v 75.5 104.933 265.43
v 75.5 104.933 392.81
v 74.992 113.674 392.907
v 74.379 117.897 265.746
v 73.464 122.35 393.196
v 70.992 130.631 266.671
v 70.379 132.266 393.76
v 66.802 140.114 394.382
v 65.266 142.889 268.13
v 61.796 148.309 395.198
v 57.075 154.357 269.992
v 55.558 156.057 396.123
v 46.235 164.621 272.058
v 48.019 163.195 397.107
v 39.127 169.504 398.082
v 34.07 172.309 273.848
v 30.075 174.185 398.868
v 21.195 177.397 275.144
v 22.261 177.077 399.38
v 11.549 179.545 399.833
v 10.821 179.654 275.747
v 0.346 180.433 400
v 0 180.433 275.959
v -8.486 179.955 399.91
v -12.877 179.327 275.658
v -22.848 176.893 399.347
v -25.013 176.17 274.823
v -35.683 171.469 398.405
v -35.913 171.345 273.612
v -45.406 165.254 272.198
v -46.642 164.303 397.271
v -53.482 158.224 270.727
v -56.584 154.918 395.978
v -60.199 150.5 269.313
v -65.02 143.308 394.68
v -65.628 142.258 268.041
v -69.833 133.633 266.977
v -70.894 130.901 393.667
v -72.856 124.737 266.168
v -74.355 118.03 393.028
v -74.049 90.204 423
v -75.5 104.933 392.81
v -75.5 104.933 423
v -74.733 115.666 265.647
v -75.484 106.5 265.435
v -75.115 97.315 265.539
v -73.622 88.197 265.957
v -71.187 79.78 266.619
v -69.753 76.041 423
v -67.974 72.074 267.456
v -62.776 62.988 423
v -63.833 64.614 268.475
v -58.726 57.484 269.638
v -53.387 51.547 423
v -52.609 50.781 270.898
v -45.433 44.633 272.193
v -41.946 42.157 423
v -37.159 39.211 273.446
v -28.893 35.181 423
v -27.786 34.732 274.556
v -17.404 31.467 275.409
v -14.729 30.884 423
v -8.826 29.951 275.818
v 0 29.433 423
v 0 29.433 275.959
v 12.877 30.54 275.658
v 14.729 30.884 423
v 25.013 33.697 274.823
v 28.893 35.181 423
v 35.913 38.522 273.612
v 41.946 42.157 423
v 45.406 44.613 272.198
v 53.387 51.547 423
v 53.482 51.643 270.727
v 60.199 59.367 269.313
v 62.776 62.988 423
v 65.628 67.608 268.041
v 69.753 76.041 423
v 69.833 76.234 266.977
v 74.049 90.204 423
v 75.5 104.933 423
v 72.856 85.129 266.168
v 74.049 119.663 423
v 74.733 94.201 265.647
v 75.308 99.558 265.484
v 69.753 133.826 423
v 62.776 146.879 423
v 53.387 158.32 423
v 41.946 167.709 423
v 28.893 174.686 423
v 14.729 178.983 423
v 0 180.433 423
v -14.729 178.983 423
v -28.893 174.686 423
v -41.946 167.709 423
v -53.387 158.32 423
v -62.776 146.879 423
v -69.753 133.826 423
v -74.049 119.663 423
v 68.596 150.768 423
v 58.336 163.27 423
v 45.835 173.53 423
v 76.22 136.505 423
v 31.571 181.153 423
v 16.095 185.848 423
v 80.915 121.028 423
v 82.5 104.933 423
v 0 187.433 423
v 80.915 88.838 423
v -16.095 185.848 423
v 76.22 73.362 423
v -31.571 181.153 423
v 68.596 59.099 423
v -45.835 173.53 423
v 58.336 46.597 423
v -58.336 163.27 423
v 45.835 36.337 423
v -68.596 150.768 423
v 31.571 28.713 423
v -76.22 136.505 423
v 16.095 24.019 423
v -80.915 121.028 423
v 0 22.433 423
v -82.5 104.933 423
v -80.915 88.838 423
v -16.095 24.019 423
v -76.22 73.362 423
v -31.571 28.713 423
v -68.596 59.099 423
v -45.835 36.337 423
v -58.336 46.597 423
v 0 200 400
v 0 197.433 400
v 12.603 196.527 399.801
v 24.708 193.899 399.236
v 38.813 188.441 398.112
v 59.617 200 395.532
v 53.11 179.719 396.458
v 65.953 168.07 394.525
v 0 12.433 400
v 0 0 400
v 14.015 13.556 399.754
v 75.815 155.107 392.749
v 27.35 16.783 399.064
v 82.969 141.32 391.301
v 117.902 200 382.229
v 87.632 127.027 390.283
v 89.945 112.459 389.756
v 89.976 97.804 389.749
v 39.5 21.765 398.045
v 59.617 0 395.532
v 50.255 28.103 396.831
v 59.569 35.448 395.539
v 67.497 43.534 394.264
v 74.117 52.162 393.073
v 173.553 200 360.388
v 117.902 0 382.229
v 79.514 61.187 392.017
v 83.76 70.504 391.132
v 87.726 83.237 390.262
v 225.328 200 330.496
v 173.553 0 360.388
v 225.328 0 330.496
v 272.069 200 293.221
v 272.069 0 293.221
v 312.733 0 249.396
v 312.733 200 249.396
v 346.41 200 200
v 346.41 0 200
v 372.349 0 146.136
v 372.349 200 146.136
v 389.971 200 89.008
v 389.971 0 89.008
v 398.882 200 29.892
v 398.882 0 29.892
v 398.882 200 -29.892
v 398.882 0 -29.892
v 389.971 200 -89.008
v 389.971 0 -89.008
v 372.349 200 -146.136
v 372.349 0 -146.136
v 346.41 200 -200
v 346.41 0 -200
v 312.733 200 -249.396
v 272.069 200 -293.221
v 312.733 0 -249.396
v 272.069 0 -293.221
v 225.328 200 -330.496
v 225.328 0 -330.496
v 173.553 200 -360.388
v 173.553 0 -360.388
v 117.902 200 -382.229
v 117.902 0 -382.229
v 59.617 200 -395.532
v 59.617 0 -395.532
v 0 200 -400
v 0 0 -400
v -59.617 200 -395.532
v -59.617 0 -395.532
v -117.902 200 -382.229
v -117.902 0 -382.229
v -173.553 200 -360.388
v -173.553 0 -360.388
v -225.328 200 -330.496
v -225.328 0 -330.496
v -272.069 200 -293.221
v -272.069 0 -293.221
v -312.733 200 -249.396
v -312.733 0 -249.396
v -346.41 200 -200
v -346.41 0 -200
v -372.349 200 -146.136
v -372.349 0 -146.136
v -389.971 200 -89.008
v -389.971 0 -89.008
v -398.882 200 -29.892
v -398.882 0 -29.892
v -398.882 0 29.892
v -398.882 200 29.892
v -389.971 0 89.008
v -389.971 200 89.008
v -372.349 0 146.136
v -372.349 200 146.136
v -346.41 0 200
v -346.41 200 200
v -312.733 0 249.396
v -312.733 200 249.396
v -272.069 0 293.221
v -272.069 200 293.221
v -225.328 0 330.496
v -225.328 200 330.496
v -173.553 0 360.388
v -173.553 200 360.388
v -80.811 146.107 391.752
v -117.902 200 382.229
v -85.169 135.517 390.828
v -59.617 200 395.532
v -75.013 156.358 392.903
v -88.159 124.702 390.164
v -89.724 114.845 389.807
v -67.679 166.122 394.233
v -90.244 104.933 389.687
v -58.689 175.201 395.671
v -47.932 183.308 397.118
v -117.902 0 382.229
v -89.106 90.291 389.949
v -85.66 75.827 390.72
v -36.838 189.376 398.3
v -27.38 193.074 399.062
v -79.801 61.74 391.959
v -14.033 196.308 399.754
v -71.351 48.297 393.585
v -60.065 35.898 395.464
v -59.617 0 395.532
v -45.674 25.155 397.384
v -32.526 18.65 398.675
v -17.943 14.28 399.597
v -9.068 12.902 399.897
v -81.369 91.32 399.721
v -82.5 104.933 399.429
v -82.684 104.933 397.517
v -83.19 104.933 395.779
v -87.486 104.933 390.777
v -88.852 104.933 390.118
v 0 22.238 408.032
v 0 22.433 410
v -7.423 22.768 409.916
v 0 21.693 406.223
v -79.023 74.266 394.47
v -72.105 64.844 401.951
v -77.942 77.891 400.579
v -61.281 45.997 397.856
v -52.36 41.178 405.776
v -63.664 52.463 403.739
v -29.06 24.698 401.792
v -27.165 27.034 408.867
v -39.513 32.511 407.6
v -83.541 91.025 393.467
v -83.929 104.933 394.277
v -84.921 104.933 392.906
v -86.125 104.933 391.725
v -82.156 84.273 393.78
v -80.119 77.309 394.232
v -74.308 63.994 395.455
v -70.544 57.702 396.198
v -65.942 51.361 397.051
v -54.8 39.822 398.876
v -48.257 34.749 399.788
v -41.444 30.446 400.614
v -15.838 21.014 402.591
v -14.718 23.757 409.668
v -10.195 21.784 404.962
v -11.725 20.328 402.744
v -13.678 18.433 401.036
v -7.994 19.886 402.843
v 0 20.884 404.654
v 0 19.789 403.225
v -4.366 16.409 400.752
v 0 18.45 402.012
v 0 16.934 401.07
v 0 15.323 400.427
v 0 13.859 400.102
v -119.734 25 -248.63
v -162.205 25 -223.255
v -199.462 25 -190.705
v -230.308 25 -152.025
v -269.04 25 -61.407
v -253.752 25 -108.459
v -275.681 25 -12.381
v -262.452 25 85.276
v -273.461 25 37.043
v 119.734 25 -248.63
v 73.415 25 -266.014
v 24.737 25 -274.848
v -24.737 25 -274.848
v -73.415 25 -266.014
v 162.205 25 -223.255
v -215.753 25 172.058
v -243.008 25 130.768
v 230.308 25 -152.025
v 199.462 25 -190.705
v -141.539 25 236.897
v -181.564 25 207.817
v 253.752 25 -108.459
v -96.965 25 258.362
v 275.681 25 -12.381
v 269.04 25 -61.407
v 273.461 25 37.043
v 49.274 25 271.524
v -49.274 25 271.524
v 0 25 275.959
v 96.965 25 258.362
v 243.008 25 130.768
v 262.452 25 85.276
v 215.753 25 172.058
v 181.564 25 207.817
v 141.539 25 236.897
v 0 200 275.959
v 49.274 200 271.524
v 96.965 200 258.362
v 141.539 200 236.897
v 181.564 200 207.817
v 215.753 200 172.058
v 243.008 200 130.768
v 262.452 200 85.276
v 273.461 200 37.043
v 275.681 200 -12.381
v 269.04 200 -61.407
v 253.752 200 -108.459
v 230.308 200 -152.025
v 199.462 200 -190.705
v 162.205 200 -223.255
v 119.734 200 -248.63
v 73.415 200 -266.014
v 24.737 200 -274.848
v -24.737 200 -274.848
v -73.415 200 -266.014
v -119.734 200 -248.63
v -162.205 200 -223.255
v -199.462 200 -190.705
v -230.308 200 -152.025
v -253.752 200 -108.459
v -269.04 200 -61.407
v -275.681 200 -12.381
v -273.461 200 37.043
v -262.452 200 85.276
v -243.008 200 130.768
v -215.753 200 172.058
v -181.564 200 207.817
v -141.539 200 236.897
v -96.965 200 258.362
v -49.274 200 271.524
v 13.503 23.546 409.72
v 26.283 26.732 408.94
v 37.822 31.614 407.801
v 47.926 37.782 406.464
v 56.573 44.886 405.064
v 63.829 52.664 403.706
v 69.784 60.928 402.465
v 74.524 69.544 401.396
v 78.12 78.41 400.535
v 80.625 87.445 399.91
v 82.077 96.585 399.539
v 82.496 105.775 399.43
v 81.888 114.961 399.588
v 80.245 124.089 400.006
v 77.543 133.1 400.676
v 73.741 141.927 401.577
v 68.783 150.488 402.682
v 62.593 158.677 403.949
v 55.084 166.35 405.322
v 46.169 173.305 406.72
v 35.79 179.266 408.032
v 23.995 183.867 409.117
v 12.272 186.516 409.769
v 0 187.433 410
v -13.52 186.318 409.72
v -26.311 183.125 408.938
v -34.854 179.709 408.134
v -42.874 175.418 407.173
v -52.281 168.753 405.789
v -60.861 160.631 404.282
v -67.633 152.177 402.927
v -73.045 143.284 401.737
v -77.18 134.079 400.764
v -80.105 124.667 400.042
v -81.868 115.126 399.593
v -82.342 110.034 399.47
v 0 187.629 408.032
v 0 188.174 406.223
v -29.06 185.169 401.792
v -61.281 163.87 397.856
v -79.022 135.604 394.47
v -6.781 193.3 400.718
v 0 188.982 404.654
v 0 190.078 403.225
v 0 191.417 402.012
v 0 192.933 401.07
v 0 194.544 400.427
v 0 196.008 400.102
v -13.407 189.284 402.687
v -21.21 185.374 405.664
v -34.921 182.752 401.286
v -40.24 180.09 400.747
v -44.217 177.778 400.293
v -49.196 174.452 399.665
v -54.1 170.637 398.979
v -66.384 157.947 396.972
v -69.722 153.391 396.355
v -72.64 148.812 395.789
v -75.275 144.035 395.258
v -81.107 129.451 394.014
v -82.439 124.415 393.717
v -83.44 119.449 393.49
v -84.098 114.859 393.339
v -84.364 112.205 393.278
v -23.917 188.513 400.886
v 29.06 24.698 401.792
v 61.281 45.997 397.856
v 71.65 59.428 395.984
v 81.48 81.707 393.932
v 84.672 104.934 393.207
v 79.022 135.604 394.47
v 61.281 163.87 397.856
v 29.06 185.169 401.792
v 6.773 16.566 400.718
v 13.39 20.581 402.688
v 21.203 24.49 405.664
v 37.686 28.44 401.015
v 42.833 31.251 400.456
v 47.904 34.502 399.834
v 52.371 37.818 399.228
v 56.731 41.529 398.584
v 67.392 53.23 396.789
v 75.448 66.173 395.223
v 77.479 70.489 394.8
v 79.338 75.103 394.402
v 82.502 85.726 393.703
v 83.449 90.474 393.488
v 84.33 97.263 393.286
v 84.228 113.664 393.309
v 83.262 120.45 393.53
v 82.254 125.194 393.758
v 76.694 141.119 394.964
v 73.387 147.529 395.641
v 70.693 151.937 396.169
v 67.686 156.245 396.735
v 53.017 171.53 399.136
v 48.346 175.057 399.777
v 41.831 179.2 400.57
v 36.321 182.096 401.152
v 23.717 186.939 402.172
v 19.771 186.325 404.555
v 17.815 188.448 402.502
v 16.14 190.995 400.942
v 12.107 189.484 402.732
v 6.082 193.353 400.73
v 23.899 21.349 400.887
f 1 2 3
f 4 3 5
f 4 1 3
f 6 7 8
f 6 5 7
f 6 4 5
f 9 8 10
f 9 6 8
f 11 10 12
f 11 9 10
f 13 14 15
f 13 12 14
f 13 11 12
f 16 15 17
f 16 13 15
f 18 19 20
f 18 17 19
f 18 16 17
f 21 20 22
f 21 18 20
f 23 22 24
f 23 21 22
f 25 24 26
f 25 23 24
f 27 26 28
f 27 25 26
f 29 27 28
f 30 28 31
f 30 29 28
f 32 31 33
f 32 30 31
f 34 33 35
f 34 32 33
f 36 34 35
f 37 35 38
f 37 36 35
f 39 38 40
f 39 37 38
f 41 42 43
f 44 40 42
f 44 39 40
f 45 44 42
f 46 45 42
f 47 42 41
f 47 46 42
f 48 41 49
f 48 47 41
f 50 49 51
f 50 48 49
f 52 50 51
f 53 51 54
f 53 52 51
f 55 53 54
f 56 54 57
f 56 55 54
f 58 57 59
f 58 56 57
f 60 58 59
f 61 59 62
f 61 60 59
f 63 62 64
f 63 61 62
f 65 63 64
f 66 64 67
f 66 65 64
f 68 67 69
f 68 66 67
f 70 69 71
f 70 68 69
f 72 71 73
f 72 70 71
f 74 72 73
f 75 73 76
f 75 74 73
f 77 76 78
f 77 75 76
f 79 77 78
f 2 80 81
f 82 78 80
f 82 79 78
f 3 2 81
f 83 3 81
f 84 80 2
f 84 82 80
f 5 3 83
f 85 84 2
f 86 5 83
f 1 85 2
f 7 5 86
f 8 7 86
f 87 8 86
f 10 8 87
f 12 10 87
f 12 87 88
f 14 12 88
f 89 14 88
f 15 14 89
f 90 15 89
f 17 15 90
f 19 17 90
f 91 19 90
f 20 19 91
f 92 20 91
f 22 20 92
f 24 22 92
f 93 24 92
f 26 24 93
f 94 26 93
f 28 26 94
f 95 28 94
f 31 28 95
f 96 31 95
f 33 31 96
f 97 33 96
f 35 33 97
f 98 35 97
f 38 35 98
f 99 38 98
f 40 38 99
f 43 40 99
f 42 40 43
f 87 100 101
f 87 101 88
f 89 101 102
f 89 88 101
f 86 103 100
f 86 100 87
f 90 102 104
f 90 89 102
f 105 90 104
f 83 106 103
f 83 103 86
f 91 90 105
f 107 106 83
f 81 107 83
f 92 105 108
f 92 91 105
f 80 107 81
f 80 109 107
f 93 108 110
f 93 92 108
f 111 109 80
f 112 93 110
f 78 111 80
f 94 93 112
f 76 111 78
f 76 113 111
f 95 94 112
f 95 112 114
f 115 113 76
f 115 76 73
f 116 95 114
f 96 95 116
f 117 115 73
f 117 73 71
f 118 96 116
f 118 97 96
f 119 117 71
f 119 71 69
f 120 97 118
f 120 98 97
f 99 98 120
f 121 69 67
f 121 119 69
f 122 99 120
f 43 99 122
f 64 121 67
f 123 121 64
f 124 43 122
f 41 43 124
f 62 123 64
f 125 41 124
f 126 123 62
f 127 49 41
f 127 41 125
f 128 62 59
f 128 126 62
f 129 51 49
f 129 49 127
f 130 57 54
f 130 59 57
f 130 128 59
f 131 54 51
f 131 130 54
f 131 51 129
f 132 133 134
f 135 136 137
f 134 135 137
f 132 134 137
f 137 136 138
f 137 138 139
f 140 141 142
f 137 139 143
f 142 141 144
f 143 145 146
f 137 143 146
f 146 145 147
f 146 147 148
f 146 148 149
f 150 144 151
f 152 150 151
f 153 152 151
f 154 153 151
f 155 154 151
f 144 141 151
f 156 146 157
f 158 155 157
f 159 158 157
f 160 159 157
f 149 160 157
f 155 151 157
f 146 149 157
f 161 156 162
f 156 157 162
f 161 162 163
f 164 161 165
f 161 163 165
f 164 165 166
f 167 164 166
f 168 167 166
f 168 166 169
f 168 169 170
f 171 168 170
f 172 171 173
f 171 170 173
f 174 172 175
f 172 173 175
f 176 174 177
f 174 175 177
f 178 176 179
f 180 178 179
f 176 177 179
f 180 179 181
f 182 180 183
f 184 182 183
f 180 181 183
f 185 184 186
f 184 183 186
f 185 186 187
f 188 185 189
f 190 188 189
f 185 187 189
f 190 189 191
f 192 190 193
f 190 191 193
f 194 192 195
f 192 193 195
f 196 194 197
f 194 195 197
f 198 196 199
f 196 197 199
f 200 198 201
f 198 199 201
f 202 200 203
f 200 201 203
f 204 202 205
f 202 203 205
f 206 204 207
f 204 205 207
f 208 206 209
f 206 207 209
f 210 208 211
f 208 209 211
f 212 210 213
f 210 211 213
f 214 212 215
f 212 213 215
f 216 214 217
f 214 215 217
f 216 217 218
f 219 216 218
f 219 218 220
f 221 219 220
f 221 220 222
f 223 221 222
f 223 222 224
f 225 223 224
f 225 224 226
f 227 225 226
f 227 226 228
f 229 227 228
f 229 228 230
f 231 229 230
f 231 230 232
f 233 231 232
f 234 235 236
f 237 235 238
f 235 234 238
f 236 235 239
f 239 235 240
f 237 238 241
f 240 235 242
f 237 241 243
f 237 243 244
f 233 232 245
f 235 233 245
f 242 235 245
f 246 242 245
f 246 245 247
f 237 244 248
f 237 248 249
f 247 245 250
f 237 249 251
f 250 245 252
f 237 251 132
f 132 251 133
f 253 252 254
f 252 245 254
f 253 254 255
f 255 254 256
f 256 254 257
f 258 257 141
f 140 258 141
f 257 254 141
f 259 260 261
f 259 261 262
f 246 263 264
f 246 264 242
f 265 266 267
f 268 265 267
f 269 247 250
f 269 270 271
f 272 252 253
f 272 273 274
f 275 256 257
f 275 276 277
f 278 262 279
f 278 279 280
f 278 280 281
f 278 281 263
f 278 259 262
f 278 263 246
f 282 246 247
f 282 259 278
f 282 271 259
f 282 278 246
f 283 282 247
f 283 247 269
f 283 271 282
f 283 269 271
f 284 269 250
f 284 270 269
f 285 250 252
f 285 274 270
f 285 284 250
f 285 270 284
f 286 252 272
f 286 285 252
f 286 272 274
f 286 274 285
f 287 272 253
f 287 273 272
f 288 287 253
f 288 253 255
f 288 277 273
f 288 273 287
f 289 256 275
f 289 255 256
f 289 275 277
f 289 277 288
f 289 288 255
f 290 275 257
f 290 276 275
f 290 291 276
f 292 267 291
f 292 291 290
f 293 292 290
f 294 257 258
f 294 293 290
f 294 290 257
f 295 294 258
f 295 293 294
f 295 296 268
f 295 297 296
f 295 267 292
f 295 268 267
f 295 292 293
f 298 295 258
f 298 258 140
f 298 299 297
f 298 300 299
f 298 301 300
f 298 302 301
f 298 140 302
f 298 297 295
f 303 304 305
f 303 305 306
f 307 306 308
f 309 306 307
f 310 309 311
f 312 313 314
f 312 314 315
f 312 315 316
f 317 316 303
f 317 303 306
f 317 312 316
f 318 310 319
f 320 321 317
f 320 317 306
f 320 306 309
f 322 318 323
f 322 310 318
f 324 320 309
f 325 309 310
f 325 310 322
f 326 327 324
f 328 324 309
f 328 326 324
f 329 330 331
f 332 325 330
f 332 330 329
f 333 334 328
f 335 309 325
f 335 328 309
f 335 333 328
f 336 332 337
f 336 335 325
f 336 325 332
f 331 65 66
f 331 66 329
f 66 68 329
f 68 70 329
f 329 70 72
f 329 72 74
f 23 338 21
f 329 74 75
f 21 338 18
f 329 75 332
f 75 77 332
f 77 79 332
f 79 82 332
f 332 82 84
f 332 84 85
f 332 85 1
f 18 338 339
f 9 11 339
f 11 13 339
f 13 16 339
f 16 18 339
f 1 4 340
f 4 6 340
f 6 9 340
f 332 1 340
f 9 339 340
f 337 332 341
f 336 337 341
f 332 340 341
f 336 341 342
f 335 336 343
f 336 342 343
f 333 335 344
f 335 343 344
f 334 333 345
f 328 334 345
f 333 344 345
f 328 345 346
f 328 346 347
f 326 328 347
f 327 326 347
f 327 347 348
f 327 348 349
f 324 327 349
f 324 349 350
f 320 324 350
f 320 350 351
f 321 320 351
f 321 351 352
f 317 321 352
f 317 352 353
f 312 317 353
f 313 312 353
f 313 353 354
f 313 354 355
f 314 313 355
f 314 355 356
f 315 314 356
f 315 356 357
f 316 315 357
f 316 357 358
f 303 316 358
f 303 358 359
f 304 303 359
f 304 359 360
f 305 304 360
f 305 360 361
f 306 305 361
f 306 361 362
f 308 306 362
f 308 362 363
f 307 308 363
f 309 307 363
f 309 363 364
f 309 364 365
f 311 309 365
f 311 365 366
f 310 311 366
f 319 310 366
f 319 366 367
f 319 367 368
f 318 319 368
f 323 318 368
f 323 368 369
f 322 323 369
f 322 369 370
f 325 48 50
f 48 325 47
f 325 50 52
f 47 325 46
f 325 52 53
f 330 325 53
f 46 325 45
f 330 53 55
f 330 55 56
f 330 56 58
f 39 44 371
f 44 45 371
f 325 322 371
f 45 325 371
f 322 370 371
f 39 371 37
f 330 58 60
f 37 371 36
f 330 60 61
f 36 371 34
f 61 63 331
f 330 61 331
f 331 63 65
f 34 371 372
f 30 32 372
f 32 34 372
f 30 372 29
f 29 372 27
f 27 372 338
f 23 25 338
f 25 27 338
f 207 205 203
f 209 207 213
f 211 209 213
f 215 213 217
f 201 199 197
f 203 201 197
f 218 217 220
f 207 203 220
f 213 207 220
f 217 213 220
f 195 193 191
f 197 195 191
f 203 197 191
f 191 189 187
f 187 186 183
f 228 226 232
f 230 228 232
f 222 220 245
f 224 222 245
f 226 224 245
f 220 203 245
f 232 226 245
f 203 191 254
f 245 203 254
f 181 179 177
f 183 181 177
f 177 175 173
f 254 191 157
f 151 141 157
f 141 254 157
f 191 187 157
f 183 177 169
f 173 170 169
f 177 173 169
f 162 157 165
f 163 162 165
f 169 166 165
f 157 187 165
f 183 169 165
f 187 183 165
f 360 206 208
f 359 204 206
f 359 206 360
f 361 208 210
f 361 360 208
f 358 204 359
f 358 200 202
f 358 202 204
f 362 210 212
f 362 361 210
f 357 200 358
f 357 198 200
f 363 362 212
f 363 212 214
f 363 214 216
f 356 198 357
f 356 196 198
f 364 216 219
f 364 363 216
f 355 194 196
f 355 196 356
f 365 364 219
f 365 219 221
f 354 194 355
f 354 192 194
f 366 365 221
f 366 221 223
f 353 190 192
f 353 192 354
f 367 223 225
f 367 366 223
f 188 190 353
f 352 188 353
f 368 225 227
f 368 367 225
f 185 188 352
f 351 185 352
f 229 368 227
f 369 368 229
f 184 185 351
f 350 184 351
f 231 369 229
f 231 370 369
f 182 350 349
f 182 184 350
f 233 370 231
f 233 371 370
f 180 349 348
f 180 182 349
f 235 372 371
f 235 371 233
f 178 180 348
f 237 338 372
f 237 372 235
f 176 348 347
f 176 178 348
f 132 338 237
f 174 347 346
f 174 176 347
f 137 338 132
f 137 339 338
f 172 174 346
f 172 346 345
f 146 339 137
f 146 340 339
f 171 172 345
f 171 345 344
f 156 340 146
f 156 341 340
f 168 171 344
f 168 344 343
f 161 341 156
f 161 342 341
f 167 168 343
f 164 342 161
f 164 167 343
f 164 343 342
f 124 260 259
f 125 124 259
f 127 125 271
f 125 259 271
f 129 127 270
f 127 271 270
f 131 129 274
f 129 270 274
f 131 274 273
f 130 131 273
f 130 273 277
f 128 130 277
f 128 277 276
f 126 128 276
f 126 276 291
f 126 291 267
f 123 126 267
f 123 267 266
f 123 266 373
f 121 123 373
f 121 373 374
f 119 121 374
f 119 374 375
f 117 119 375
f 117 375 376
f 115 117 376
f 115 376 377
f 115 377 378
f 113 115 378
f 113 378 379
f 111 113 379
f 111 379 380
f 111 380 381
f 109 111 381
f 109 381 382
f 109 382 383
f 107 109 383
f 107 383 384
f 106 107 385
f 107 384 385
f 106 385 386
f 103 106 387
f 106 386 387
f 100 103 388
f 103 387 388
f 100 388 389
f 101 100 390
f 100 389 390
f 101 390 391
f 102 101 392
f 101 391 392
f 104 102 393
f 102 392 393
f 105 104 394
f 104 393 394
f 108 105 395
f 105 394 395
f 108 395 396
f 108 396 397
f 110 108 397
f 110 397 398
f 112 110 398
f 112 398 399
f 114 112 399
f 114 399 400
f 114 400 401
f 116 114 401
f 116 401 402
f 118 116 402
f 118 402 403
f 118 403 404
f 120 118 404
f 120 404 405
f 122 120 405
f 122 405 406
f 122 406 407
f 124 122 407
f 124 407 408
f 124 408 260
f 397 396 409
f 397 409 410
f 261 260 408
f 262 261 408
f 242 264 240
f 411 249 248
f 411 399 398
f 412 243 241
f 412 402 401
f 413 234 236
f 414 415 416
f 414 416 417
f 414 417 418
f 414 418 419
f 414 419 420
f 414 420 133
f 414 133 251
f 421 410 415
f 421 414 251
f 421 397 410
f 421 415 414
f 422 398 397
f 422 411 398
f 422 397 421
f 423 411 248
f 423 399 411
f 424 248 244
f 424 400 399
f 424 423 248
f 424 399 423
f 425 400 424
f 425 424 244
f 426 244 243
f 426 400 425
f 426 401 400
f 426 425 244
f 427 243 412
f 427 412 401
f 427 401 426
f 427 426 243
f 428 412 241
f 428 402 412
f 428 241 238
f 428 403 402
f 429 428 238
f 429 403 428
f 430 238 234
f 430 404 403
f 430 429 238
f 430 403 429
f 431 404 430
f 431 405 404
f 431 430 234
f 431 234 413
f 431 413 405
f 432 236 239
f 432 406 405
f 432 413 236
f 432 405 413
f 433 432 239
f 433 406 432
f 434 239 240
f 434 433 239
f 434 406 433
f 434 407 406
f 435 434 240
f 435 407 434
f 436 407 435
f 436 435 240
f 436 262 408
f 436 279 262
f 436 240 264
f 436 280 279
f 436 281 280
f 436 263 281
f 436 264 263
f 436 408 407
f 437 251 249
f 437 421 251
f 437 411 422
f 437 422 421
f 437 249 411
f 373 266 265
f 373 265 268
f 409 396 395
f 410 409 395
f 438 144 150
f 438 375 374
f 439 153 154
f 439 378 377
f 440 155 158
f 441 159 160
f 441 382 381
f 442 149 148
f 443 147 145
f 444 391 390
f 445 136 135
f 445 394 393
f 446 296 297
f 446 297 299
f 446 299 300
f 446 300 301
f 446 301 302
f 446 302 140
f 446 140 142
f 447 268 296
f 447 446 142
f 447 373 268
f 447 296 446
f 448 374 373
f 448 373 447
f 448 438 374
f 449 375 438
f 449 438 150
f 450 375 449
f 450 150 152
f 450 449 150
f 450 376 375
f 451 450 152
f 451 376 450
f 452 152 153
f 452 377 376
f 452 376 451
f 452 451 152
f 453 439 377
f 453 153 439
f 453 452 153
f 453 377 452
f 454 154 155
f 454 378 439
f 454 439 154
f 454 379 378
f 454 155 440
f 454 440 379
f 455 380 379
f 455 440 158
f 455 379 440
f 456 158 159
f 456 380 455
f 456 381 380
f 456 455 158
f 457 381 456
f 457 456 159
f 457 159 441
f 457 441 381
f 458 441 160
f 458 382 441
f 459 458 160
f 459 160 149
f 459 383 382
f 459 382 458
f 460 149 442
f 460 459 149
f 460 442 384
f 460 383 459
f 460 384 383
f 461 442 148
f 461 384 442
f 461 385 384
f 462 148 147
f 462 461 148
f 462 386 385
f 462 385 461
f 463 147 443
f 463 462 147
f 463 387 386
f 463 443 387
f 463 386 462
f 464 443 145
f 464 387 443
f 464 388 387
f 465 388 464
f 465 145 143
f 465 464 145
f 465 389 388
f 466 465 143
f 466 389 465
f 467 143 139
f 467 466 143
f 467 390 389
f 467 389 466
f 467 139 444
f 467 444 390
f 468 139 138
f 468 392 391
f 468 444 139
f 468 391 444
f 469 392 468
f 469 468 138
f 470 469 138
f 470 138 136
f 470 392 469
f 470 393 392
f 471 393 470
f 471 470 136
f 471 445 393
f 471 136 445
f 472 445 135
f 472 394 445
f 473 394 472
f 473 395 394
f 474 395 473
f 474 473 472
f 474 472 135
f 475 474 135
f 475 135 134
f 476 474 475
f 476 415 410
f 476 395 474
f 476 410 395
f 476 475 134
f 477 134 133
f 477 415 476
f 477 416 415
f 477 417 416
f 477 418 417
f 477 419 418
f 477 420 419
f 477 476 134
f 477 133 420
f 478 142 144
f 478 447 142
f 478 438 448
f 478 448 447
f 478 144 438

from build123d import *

# Parameters (mm, degrees)
SKETCH1_R           = 400
BOSS_EXTRUDE1_DEPTH = 200
BOSS_EXTRUDE2_START = -10
SKETCH2_R           = 82.5
SKETCH2_R_2         = 75.5
BOSS_EXTRUDE2_DEPTH = 33
CUT_EXTRUDE1_START  = -432
SKETCH2_2_R         = 75.5
CUT_EXTRUDE1_DEPTH  = 432
SKETCH3_R           = 275.958825931
CUT_EXTRUDE3_DEPTH  = 175
FILLET2_R           = 10


with BuildPart() as part:
    # Sketch1 → Boss-Extrude1 (new body)
    with BuildSketch(Plane(origin=(0, 0, 0), x_dir=(1, 0, 0), z_dir=(0, 1, 0))):
        Circle(SKETCH1_R)
    extrude(amount=BOSS_EXTRUDE1_DEPTH)

    # Sketch2 → Boss-Extrude2 (add)
    with BuildSketch(Plane.XY.offset(400).offset(BOSS_EXTRUDE2_START)):
        with Locations((0, 104.933431854)):
            Circle(SKETCH2_R)
        with Locations((0, 104.933431854)):
            Circle(SKETCH2_R_2, mode=Mode.SUBTRACT)
    extrude(amount=BOSS_EXTRUDE2_DEPTH)

    # Sketch2<2> → Cut-Extrude1 (cut)
    with BuildSketch(Plane.XY.offset(400).offset(CUT_EXTRUDE1_START)):
        with Locations((0, 104.933431854)):
            Circle(SKETCH2_2_R)
    extrude(amount=CUT_EXTRUDE1_DEPTH, mode=Mode.SUBTRACT)

    # Sketch3 → Cut-Extrude3 (cut)
    with BuildSketch(Plane(origin=(0, 200, 0), x_dir=(1, 0, 0), z_dir=(0, 1, 0))):
        Circle(SKETCH3_R)
    extrude(amount=-CUT_EXTRUDE3_DEPTH, mode=Mode.SUBTRACT)

    # Fillet2
    fillet2_edges = [part.edges().sort_by_distance(p)[0] for p in [
        (-82.5, 104.933431854, 391.399731732),
    ]]
    fillet(fillet2_edges, radius=FILLET2_R)


solid = part.part
